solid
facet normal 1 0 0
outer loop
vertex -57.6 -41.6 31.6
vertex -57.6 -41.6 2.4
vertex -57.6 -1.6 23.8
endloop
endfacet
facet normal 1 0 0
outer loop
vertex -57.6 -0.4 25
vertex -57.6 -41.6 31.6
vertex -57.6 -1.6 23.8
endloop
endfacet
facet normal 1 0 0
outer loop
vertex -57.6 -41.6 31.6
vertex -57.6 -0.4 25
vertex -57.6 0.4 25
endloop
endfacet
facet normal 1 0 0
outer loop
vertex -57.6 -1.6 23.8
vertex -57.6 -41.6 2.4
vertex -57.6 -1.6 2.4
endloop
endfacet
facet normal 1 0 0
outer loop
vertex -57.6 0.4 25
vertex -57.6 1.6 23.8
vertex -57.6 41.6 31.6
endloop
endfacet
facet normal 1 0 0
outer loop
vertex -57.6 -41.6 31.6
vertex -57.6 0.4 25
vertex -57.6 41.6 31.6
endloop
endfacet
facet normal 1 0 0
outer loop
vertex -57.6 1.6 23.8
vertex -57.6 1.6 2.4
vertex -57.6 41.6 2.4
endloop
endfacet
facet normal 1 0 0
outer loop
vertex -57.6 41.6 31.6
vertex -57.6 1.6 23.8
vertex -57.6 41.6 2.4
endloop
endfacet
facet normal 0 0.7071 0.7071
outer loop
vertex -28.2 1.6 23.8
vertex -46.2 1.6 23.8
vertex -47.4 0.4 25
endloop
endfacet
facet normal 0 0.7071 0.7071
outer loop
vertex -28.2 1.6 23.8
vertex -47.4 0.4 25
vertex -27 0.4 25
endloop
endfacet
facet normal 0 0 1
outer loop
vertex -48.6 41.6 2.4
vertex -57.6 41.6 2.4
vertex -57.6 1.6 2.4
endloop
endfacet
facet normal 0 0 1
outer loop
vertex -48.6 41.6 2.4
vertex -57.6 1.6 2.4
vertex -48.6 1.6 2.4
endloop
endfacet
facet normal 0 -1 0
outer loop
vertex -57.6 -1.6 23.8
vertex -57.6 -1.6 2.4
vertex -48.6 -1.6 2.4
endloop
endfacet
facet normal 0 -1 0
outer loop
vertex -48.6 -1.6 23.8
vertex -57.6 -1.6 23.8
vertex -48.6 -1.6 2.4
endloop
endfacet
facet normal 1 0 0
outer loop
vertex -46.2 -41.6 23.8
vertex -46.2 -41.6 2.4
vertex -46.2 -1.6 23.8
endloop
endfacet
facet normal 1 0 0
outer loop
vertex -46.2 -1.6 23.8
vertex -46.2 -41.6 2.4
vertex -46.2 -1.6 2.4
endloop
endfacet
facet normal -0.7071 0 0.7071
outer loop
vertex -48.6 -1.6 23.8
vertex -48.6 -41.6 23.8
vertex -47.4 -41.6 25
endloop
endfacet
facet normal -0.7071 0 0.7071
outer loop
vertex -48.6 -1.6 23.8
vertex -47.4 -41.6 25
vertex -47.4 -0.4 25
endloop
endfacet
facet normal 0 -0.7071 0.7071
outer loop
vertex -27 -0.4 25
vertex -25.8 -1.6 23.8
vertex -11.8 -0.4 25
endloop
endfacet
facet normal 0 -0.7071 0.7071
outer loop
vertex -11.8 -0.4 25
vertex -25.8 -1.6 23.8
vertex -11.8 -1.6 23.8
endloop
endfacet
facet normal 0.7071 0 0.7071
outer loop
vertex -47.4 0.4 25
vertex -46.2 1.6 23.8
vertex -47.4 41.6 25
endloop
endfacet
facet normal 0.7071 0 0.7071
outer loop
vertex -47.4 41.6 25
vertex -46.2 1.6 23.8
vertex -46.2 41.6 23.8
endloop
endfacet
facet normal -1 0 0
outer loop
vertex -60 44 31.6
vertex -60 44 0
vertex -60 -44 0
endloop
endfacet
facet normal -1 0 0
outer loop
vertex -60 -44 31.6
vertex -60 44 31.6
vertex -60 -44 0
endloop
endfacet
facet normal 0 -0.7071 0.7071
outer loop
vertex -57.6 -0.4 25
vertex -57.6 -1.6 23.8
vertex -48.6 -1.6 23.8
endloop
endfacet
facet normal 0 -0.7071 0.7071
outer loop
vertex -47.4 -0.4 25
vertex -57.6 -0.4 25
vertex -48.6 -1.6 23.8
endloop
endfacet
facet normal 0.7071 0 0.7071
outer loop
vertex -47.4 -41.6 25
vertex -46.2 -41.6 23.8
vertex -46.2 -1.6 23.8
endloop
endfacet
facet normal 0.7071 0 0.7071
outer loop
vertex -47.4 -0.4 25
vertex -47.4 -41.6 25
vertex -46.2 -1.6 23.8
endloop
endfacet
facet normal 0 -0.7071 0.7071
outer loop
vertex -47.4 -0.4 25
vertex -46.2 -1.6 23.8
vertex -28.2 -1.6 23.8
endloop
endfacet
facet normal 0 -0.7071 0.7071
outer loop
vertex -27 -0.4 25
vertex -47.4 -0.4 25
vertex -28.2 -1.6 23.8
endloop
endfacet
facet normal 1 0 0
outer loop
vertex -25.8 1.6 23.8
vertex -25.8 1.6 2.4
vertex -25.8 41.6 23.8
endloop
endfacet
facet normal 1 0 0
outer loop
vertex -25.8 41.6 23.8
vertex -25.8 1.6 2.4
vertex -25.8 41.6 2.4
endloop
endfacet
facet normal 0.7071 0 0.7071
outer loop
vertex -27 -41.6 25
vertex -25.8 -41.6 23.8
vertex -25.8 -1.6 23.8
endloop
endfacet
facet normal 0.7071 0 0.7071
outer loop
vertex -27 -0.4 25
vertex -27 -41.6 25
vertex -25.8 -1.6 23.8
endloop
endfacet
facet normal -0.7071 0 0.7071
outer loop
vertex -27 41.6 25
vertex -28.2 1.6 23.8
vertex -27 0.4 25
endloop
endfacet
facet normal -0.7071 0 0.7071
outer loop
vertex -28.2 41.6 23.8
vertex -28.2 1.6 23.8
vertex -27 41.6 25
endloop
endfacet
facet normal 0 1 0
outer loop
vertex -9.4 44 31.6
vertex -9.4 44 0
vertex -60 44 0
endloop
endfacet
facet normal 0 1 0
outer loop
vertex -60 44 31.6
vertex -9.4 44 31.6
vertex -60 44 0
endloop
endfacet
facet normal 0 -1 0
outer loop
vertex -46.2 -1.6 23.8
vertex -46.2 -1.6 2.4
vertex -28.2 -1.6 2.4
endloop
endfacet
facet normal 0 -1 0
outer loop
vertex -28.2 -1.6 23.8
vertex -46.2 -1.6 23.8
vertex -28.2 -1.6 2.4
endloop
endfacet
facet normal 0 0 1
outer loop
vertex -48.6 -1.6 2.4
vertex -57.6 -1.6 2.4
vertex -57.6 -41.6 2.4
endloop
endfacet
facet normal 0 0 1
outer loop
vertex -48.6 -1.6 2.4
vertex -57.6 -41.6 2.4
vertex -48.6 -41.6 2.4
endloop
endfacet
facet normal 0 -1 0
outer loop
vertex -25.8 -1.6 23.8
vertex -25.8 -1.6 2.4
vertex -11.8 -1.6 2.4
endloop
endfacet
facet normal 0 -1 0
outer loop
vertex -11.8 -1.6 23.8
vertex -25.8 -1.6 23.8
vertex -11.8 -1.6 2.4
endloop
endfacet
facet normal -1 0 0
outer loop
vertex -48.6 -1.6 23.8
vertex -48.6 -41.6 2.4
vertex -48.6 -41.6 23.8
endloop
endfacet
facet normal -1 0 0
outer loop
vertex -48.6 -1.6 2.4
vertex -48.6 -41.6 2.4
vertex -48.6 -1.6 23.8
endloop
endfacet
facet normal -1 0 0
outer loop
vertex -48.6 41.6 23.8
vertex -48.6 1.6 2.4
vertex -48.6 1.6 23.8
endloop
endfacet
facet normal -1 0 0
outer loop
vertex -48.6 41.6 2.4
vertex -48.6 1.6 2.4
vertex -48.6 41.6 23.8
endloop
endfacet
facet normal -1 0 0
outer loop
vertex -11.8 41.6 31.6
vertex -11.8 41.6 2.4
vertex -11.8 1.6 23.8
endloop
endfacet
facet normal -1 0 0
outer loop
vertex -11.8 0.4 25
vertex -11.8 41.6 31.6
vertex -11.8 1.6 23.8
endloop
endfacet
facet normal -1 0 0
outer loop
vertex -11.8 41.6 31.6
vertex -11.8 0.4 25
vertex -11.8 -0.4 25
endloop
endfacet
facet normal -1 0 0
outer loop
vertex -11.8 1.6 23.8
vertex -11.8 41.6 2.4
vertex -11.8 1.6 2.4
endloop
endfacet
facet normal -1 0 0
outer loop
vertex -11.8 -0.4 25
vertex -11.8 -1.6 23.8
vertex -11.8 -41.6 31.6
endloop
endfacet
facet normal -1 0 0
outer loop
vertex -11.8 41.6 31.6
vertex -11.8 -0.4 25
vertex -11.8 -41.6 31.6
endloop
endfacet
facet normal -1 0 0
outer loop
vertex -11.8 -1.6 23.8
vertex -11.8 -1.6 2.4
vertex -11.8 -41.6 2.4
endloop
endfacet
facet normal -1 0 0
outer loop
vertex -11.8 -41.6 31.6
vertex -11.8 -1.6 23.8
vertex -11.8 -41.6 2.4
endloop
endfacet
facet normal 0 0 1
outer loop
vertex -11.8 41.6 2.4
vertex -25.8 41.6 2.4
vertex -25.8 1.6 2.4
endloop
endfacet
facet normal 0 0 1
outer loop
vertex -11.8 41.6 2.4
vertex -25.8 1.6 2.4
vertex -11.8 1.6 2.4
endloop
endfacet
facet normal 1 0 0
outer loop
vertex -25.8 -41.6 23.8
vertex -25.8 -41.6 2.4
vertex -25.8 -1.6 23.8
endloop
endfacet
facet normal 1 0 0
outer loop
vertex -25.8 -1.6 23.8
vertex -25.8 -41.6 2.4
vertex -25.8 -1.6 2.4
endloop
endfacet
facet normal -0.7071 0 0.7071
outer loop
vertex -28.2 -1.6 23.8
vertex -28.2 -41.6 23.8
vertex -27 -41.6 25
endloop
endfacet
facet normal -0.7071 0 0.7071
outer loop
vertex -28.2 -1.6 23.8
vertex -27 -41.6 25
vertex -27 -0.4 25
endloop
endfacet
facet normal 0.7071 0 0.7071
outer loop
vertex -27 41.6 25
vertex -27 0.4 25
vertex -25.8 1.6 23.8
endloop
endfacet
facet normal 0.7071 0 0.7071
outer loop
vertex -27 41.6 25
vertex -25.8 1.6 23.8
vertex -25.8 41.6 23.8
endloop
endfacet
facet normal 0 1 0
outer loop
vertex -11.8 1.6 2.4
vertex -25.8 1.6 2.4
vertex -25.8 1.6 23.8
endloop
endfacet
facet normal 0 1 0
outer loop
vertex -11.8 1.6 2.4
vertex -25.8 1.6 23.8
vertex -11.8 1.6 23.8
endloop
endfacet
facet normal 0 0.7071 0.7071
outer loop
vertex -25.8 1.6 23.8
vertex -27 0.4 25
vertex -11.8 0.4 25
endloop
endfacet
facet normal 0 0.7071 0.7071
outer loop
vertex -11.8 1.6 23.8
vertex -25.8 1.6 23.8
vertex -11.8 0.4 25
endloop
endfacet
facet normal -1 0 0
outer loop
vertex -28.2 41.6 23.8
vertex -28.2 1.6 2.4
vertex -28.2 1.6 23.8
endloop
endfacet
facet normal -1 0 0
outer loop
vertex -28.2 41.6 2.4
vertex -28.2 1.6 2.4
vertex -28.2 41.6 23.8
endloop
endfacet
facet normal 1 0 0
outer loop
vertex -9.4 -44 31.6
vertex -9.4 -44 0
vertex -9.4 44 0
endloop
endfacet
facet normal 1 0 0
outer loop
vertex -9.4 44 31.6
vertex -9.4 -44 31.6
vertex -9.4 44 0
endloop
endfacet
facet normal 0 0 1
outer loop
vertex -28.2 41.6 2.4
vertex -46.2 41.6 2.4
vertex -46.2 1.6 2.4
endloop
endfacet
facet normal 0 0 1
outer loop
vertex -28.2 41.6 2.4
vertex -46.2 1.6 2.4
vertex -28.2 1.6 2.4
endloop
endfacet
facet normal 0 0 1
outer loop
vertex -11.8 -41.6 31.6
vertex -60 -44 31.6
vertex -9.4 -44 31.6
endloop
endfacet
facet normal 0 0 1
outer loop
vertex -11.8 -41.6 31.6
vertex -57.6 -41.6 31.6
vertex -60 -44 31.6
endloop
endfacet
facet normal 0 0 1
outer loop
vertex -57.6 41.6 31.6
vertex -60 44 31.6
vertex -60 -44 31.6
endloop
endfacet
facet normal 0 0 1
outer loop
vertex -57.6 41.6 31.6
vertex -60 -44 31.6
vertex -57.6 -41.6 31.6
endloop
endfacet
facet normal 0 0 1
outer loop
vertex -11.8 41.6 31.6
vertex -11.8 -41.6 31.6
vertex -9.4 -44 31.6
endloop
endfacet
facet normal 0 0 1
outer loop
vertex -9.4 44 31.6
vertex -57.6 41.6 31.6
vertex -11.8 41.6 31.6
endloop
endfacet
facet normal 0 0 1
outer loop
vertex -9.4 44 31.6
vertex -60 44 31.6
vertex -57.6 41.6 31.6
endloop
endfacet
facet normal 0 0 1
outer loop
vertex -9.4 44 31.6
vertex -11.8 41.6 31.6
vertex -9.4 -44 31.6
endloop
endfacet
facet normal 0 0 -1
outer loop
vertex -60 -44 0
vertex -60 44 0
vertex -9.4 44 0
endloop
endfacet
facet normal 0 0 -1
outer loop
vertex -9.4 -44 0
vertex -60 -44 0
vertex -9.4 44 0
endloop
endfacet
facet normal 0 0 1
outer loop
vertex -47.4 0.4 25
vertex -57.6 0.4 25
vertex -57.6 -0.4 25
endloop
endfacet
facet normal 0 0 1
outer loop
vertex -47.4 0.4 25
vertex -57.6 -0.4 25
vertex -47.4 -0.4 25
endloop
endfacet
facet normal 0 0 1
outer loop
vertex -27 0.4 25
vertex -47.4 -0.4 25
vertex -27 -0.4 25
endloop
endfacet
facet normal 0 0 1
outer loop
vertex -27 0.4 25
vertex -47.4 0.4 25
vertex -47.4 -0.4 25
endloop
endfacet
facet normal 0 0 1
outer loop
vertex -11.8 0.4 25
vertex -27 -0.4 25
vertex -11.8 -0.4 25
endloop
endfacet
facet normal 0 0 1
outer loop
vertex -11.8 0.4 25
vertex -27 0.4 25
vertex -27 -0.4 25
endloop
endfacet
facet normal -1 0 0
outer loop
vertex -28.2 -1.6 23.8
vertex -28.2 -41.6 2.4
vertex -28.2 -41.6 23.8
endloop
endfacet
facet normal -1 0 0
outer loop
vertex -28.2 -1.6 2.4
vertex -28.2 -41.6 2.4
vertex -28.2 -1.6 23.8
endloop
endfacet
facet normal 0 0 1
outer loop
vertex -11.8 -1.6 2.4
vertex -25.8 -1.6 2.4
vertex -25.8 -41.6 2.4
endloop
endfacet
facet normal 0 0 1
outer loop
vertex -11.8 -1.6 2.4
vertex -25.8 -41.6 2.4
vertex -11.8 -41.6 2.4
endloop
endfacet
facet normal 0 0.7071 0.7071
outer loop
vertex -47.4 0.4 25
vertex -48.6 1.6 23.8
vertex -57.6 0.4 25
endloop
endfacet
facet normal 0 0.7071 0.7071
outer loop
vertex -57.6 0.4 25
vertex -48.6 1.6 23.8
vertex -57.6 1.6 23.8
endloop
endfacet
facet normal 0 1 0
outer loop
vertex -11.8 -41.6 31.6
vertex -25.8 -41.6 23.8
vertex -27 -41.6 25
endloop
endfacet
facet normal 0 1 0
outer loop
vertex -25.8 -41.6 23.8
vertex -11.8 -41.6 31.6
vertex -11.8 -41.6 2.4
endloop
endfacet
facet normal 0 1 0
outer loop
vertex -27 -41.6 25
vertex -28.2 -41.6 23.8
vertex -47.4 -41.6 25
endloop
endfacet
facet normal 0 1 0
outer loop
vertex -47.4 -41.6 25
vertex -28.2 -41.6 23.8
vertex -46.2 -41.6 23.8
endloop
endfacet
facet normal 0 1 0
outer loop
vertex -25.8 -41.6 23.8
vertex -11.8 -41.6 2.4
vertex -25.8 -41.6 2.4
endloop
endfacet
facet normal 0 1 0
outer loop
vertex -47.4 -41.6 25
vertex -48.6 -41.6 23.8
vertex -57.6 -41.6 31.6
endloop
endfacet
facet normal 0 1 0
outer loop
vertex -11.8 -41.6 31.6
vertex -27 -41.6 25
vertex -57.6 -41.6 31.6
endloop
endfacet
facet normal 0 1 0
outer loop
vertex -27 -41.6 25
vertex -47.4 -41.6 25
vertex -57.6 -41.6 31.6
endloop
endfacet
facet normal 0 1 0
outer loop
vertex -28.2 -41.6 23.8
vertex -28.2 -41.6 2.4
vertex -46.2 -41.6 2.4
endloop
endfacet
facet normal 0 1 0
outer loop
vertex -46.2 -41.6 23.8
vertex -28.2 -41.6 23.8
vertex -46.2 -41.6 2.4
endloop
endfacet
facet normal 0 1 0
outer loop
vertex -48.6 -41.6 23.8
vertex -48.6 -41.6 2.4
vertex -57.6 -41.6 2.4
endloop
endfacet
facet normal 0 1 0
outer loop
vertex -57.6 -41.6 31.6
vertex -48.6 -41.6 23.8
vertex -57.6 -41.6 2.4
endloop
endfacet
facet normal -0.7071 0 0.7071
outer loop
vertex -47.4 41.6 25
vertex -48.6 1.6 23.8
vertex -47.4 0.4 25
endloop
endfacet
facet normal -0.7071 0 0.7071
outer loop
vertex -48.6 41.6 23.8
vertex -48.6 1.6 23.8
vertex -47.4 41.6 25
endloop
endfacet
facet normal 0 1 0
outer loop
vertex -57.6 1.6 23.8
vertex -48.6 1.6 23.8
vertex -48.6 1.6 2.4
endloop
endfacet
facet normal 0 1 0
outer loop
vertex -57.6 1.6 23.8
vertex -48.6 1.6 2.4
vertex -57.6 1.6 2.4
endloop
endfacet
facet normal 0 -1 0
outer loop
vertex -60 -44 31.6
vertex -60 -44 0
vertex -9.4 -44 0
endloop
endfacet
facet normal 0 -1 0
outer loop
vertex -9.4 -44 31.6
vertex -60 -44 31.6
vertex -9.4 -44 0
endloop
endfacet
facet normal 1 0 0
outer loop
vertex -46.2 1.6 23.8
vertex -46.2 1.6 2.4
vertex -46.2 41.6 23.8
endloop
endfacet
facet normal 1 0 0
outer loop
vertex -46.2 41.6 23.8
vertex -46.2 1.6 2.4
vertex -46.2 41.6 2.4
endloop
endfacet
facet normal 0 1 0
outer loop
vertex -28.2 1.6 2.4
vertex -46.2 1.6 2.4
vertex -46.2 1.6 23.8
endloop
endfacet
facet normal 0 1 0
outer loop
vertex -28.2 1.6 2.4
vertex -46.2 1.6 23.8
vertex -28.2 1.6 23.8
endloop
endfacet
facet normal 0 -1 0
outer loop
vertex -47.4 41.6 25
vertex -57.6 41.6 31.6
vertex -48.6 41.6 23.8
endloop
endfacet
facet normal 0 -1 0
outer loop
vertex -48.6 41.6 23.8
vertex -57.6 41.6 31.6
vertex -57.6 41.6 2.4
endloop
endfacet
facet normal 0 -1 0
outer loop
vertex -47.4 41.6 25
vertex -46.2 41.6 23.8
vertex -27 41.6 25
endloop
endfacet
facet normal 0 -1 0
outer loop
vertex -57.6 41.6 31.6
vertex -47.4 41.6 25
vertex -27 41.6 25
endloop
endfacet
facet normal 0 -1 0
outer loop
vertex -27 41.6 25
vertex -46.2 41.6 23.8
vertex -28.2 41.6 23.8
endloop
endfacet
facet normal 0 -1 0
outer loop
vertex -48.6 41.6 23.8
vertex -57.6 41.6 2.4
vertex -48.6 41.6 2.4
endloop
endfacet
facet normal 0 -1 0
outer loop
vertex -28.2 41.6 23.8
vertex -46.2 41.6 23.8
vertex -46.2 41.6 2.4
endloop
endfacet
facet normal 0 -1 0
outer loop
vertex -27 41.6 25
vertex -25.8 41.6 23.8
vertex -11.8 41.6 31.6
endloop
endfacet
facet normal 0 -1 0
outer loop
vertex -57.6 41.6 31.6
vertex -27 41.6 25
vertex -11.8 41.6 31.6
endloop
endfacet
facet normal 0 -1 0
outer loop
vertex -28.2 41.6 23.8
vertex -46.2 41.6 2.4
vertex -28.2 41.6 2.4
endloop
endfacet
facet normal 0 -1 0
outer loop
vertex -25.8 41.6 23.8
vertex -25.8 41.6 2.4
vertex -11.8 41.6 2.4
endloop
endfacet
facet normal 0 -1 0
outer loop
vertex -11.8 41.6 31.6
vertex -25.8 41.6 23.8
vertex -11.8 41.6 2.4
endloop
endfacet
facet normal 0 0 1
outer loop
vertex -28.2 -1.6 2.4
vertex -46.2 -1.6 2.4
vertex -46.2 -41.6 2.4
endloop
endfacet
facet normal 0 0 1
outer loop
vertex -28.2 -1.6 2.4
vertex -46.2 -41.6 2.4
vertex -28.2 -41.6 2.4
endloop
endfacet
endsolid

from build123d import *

# Parameters (mm, degrees)
F0_W     = 2.4
F0_H     = 40
F0_H_2   = 3.2
F1_DEPTH = 31.6
F0_W_2   = 9
F0_W_3   = 18
F0_W_4   = 14
F2_DEPTH = 2.4
F3_DEPTH = 25
F4_SIZE  = 1.19999


# Not quite as in the source:
# - a fillet or chamfer is up to 0.001 mm smaller than in the source, because OpenCascade refuses the exact size


with BuildPart() as f1:
    # F0 (on Top) → F1 (new body)
    with BuildSketch(Plane.XY):
        Polygon((-9.4000064151, 44), (-60.0000064151, 44), (-60.0000064151, -44), (-9.4000064151, -44), (-9.4000064151, -41.6), (-11.8000064151, -41.6), (-25.8000064151, -41.6), (-28.2000064151, -41.6), (-46.2000064151, -41.6), (-48.6000064151, -41.6), (-57.6000064151, -41.6), (-57.6000064151, -1.6), (-57.6000064151, 1.6), (-57.6000064151, 41.6), (-48.6000064151, 41.6), (-46.2000064151, 41.6), (-28.2000064151, 41.6), (-25.8000064151, 41.6), (-11.8000064151, 41.6), (-9.4000064151, 41.6), align=None)
        with Locations((-10.6000064151, 21.6)):
            Rectangle(F0_W, F0_H)
        with Locations((-10.6000064151, 0)):
            Rectangle(F0_W, F0_H_2)
        with Locations((-10.6000064151, -21.6)):
            Rectangle(F0_W, F0_H)
    extrude(amount=F1_DEPTH)

    # F0 (on Top) → F2 (join)
    with BuildSketch(Plane.XY):
        with Locations((-53.1000064151, 21.6)):
            Rectangle(F0_W_2, F0_H)
        with Locations((-53.1000064151, 0)):
            Rectangle(F0_W_2, F0_H_2)
        with Locations((-53.1000064151, -21.6)):
            Rectangle(F0_W_2, F0_H)
        with Locations((-37.2000064151, 21.6)):
            Rectangle(F0_W_3, F0_H)
        with Locations((-37.2000064151, 0)):
            Rectangle(F0_W_3, F0_H_2)
        with Locations((-37.2000064151, -21.6)):
            Rectangle(F0_W_3, F0_H)
        with Locations((-18.8000064151, 21.6)):
            Rectangle(F0_W_4, F0_H)
        with Locations((-18.8000064151, 0)):
            Rectangle(F0_W_4, F0_H_2)
        with Locations((-18.8000064151, -21.6)):
            Rectangle(F0_W_4, F0_H)
    extrude(amount=F2_DEPTH)

    # F0 (on Top) → F3 (join)
    with BuildSketch(Plane.XY):
        Polygon((-9.4000064151, 44), (-60.0000064151, 44), (-60.0000064151, -44), (-9.4000064151, -44), (-9.4000064151, -41.6), (-11.8000064151, -41.6), (-25.8000064151, -41.6), (-28.2000064151, -41.6), (-46.2000064151, -41.6), (-48.6000064151, -41.6), (-57.6000064151, -41.6), (-57.6000064151, -1.6), (-57.6000064151, 1.6), (-57.6000064151, 41.6), (-48.6000064151, 41.6), (-46.2000064151, 41.6), (-28.2000064151, 41.6), (-25.8000064151, 41.6), (-11.8000064151, 41.6), (-9.4000064151, 41.6), align=None)
        with Locations((-10.6000064151, 21.6)):
            Rectangle(F0_W, F0_H)
        with Locations((-10.6000064151, -21.6)):
            Rectangle(F0_W, F0_H)
        with Locations((-10.6000064151, 0)):
            Rectangle(F0_W, F0_H_2)
        with Locations((-53.1000064151, 0)):
            Rectangle(F0_W_2, F0_H_2)
        with Locations((-47.4000064151, 0)):
            Rectangle(F0_W, F0_H_2)
        with Locations((-47.4000064151, 21.6)):
            Rectangle(F0_W, F0_H)
        with Locations((-47.4000064151, -21.6)):
            Rectangle(F0_W, F0_H)
        with Locations((-37.2000064151, 0)):
            Rectangle(F0_W_3, F0_H_2)
        with Locations((-27.0000064151, 21.6)):
            Rectangle(F0_W, F0_H)
        with Locations((-27.0000064151, 0)):
            Rectangle(F0_W, F0_H_2)
        with Locations((-18.8000064151, 0)):
            Rectangle(F0_W_4, F0_H_2)
        with Locations((-27.0000064151, -21.6)):
            Rectangle(F0_W, F0_H)
    extrude(amount=F3_DEPTH)

    # F4 (size 1.2 in the source; OpenCascade refuses exactly that, so slightly less here)
    f4_edges = [f1.edges().sort_by_distance(p)[0] for p in [
        (-53.100006, 1.6, 25),
        (-53.100006, -1.6, 25),
        (-46.200006, -21.6, 25),
        (-48.600006, -21.6, 25),
        (-48.600006, 21.6, 25),
        (-46.200006, 21.6, 25),
        (-37.200006, 1.6, 25),
        (-37.200006, -1.6, 25),
        (-28.200006, -21.6, 25),
        (-25.800006, -21.6, 25),
        (-18.800006, -1.6, 25),
        (-18.800006, 1.6, 25),
        (-25.800006, 21.6, 25),
        (-28.200006, 21.6, 25),
    ]]
    chamfer(f4_edges, length=F4_SIZE)


solid = f1.part
